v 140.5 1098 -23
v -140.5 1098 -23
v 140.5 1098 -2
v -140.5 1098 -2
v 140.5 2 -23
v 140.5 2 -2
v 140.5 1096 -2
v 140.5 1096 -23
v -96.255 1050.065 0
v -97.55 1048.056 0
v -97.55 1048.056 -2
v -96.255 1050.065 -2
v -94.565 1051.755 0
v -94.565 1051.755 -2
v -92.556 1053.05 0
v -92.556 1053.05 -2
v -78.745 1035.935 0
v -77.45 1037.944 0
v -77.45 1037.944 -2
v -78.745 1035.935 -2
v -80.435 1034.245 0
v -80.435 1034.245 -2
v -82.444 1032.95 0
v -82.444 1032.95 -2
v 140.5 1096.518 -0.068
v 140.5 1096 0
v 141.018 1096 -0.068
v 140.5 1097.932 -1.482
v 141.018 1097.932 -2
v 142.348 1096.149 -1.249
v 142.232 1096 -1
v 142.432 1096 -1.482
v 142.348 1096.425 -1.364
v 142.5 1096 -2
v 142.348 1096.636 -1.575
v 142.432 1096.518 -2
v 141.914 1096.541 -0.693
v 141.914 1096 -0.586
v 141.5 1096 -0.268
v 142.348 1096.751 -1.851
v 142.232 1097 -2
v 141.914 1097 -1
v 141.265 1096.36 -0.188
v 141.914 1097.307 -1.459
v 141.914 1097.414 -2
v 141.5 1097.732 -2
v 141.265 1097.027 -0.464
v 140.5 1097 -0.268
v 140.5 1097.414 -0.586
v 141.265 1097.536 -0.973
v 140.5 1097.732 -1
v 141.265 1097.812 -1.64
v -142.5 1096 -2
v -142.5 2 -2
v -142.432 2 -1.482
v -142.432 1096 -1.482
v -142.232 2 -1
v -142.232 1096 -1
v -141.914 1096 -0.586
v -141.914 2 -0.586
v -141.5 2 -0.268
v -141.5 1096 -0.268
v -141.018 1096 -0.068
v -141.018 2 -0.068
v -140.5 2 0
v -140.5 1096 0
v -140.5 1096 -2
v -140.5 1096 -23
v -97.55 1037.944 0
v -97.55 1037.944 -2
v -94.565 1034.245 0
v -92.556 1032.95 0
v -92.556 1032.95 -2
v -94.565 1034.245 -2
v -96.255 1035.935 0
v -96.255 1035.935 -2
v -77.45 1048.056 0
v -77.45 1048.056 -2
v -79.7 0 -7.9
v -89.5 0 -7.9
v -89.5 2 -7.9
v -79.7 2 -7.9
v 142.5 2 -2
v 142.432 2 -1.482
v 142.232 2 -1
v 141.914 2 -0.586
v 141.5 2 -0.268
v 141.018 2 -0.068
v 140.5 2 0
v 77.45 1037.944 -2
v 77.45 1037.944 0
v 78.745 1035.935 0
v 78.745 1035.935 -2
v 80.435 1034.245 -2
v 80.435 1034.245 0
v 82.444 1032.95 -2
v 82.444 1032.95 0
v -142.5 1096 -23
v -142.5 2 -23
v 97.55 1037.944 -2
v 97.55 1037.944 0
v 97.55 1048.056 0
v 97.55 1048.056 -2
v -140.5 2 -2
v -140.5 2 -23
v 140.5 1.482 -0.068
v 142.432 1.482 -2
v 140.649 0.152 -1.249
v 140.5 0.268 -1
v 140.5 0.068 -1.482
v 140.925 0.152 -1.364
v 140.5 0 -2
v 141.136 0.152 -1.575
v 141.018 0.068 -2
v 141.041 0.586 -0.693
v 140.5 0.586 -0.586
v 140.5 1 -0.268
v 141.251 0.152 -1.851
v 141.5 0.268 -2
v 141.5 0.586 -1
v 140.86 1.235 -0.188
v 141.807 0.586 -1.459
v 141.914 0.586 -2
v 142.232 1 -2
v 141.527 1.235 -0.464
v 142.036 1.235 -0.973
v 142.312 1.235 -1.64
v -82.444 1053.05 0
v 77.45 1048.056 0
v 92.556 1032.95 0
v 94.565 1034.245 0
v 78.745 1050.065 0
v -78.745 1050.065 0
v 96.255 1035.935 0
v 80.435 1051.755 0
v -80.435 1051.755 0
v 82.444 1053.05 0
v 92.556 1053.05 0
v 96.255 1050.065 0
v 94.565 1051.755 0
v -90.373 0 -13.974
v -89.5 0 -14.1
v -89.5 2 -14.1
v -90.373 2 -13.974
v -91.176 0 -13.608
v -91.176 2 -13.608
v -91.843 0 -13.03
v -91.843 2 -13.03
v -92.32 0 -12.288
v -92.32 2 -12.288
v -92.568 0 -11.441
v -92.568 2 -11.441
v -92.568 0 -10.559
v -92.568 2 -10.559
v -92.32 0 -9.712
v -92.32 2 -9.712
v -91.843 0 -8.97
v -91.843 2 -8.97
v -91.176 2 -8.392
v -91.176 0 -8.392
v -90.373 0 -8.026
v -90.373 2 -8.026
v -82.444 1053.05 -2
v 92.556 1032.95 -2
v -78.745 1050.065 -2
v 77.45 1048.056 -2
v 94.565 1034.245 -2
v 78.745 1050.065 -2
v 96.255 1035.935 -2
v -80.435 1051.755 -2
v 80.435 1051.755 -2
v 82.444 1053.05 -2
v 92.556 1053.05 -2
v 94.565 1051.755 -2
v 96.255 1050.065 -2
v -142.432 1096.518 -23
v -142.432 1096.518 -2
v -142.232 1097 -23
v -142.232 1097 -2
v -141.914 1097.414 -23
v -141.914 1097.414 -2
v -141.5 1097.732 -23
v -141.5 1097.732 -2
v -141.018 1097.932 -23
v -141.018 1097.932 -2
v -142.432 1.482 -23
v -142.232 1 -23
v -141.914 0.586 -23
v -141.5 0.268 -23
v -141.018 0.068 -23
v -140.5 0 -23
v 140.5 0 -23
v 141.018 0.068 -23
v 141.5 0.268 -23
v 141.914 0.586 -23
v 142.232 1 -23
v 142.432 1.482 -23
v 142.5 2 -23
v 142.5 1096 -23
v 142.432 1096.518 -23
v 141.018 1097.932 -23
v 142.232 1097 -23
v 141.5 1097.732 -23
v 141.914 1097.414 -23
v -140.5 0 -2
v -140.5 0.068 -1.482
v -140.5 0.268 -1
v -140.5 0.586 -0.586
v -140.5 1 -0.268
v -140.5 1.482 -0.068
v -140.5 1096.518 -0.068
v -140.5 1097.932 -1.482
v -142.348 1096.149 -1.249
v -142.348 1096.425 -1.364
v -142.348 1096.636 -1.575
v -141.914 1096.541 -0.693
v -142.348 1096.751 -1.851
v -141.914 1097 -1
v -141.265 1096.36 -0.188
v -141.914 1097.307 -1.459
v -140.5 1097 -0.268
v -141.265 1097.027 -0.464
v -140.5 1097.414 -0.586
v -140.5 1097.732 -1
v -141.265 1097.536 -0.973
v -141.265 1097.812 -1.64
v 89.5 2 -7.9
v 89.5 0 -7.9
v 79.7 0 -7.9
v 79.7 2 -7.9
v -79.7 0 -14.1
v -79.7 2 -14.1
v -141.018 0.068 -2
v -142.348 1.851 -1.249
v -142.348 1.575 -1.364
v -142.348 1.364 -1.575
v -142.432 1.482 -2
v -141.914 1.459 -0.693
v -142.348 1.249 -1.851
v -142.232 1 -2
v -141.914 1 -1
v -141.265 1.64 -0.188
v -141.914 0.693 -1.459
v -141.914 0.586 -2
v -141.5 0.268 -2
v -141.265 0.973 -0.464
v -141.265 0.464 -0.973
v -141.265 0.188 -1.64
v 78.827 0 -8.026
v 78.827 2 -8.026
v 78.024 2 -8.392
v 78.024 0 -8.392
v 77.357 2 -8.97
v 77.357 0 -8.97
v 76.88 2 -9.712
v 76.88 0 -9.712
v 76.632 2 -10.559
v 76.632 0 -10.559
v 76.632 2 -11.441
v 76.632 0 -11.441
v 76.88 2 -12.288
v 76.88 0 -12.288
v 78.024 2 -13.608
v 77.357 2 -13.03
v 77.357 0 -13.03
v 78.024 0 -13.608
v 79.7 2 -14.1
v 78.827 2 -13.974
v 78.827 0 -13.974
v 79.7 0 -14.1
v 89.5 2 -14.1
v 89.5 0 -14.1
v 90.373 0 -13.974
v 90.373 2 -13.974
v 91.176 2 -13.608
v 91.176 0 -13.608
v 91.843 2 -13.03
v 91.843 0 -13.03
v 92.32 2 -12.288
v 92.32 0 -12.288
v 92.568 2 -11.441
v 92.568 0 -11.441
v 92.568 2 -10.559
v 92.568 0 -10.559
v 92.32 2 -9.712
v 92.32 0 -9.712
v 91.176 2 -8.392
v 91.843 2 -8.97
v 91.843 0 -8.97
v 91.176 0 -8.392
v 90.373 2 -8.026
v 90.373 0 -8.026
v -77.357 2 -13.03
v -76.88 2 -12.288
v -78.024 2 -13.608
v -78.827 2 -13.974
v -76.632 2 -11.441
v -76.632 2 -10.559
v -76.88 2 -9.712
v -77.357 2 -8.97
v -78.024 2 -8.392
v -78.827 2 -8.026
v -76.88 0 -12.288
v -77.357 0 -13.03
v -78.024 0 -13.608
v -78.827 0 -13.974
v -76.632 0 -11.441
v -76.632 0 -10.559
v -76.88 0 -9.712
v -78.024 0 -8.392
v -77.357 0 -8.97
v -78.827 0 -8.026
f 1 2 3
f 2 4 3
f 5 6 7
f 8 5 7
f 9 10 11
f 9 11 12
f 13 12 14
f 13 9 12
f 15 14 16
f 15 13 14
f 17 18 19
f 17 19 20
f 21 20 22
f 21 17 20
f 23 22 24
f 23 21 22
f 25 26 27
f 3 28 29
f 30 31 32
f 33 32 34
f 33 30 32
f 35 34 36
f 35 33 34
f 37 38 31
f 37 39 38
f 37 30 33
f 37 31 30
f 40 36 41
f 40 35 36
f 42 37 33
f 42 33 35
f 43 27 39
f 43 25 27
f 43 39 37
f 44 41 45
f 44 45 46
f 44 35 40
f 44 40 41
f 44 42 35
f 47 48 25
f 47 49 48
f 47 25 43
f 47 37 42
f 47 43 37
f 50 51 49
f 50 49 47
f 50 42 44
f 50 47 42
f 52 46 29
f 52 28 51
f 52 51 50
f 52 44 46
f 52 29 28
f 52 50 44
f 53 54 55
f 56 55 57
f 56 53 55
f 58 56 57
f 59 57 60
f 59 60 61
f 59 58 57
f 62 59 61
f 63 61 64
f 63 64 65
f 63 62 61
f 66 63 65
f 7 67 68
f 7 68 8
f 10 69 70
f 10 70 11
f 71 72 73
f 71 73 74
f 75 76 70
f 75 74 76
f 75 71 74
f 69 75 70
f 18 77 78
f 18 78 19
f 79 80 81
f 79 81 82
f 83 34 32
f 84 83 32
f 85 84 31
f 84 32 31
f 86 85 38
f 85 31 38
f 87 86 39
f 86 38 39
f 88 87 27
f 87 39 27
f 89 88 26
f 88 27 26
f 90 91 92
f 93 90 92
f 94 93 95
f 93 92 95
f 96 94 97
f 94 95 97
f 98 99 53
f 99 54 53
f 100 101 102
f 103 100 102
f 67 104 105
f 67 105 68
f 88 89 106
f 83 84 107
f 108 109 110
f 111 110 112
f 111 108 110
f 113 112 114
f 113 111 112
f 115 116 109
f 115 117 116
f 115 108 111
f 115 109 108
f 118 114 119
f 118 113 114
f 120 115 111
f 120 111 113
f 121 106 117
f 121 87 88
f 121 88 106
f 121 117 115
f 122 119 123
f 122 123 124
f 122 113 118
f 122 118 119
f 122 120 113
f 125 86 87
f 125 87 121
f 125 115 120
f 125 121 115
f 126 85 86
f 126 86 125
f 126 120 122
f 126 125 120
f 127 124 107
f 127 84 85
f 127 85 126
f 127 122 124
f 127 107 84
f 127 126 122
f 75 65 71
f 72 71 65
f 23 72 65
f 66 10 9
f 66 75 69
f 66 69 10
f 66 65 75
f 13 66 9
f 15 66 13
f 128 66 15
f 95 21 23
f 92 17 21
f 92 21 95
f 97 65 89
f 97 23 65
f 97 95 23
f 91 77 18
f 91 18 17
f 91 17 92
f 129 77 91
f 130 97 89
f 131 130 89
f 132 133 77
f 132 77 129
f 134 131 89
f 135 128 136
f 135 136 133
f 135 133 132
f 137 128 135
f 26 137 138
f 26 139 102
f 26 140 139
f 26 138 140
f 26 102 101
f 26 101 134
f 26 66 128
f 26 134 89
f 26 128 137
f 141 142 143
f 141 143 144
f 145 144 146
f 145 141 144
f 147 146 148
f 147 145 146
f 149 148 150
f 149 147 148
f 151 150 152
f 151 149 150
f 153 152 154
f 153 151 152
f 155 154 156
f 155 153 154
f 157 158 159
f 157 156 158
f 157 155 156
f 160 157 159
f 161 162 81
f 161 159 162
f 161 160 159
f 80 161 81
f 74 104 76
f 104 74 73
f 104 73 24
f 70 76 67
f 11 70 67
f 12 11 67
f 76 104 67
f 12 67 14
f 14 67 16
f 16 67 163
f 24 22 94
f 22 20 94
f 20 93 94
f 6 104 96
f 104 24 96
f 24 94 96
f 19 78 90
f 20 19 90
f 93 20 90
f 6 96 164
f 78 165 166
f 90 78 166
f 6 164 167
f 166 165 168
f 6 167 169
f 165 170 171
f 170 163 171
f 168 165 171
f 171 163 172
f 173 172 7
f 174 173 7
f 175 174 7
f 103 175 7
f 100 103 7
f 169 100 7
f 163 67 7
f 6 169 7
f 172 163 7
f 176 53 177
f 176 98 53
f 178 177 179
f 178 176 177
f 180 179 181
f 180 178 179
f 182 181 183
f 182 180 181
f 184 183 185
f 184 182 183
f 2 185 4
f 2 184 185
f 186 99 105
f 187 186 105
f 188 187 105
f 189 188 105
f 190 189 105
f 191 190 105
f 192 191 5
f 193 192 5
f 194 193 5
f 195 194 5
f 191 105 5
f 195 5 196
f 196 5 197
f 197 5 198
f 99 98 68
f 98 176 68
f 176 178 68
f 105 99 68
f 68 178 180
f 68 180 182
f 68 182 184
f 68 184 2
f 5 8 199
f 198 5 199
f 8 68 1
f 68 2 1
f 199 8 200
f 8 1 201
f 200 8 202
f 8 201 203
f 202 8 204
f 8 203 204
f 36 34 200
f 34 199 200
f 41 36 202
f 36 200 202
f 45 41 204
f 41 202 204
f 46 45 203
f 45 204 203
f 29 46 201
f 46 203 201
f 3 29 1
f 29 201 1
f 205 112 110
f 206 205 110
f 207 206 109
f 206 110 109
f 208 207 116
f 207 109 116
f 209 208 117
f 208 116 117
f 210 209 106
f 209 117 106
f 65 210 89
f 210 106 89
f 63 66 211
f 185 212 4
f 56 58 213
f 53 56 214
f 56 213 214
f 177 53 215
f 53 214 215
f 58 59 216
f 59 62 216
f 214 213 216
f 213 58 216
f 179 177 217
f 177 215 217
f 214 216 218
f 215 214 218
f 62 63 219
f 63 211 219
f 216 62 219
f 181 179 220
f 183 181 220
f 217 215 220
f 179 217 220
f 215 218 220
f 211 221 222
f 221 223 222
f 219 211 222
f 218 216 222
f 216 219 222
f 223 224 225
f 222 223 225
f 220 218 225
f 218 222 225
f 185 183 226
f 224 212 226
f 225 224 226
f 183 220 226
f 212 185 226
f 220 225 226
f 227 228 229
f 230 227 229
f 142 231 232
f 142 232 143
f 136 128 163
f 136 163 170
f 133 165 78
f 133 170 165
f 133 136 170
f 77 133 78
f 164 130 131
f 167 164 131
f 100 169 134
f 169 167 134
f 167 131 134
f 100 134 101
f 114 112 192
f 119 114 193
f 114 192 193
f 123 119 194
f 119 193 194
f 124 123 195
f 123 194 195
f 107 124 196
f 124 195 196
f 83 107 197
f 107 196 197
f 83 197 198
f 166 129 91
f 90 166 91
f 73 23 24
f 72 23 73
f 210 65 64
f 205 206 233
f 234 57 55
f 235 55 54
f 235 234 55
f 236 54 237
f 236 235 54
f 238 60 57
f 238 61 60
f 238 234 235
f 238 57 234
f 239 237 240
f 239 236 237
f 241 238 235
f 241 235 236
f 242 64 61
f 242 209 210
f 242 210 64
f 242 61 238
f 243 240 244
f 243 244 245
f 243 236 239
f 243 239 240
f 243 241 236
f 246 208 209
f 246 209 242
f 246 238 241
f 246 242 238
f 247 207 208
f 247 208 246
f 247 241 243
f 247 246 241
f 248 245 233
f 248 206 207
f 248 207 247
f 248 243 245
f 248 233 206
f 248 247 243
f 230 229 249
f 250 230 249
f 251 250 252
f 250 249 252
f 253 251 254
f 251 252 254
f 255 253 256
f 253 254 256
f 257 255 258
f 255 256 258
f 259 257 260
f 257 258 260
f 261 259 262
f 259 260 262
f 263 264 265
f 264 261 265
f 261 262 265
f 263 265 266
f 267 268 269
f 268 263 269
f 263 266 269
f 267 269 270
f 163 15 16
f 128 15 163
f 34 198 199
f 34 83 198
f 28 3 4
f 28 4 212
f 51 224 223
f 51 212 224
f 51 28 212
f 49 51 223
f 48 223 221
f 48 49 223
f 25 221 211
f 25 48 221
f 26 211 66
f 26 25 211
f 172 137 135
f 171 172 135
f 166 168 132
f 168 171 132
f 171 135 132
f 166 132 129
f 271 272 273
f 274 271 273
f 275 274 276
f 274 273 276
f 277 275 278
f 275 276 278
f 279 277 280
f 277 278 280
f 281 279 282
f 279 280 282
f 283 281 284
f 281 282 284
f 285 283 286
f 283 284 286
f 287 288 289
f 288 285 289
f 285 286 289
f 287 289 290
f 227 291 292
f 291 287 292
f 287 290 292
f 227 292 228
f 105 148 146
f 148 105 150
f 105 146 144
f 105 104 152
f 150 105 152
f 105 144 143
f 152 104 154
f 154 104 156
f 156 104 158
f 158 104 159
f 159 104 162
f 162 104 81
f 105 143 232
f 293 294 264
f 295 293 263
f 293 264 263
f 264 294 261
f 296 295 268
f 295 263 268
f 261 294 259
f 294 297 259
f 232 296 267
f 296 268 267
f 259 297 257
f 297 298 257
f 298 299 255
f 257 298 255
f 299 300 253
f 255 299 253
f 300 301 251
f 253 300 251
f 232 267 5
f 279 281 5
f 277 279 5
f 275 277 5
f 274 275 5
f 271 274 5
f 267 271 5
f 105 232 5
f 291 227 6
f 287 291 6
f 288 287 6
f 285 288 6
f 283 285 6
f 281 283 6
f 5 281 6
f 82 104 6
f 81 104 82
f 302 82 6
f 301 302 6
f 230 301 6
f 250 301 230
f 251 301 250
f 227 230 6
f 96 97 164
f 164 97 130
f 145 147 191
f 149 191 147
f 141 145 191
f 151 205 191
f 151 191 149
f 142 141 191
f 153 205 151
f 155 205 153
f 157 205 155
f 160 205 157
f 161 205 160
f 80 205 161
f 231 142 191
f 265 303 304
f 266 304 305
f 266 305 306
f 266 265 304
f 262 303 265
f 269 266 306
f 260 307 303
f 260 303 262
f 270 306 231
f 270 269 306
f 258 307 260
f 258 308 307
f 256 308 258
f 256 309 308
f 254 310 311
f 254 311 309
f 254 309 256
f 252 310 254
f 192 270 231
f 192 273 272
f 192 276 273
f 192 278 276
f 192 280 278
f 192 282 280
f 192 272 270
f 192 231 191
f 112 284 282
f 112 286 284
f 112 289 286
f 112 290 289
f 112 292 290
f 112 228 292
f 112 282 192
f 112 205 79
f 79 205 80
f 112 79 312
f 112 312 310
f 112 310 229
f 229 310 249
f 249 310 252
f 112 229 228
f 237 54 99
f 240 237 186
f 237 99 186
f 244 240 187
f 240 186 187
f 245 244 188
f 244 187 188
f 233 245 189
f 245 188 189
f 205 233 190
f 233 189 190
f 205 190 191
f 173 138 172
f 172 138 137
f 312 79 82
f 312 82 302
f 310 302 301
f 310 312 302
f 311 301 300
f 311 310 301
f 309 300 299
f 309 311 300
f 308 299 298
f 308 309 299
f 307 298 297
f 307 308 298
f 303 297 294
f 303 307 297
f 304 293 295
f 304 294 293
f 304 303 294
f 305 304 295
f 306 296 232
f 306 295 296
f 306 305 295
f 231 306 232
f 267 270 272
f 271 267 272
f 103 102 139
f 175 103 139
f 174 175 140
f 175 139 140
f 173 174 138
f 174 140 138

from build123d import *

# Parameters (mm, degrees)
SKIZZE1_W                       = 285
SKIZZE1_H                       = 1098
BASIS_LINEAR_AUSTRAGEN_DEPTH    = 23
WANDUNG1_T                      = -2
VERRUNDUNG1_R                   = 2
SCHNITT_LINEAR_AUSTRAGEN1_REACH = 1109.447
SCHNITT_LINEAR_AUSTRAGEN2_REACH = 1109.447


with BuildPart() as part:
    # Skizze1 → Basis-Linear austragen (new body)
    with BuildSketch(Plane.XY):
        with Locations((0, 549)):
            Rectangle(SKIZZE1_W, SKIZZE1_H)
    extrude(amount=-BASIS_LINEAR_AUSTRAGEN_DEPTH)

    # Wandung1
    wandung1_openings = [part.faces().sort_by_distance(p)[0] for p in [
        (0, 549, -23),
    ]]
    offset(amount=WANDUNG1_T, openings=wandung1_openings, kind=Kind.INTERSECTION)

    # Verrundung1
    verrundung1_edges = [part.edges().sort_by_distance(p)[0] for p in [
        (0, 1098, 0),
        (142.5, 549, 0),
        (0, 0, 0),
        (-142.5, 549, 0),
        (-142.5, 1098, -11.5),
        (142.5, 1098, -11.5),
        (142.5, 0, -11.5),
        (-142.5, 0, -11.5),
    ]]
    fillet(verrundung1_edges, radius=VERRUNDUNG1_R)

    # Skizze2 → Schnitt-Linear austragen1 (cut, up to next)
    with BuildSketch(Plane.XY, mode=Mode.PRIVATE) as schnitt_linear_austragen1_sk1:
        with BuildLine():
            Line((-92.555689864, 1053.05), (-82.444310136, 1053.05))
            ThreePointArc((-82.444310136, 1053.05), (-79.545048712, 1050.954951288), (-77.45, 1048.055689864))
            Line((-77.45, 1048.055689864), (-77.45, 1037.944310136))
            ThreePointArc((-77.45, 1037.944310136), (-79.545048712, 1035.045048712), (-82.444310136, 1032.95))
            Line((-82.444310136, 1032.95), (-92.555689864, 1032.95))
            ThreePointArc((-92.555689864, 1032.95), (-95.454951288, 1035.045048712), (-97.55, 1037.944310136))
            Line((-97.55, 1037.944310136), (-97.55, 1048.055689864))
            ThreePointArc((-97.55, 1048.055689864), (-95.454951288, 1050.954951288), (-92.555689864, 1053.05))
        make_face()
    schnitt_linear_austragen1_tool1 = extrude(schnitt_linear_austragen1_sk1.sketch, amount=-SCHNITT_LINEAR_AUSTRAGEN1_REACH, mode=Mode.PRIVATE) & part.part
    schnitt_linear_austragen1 = schnitt_linear_austragen1_tool1.solids().sort_by_distance((-87.5, 1043, 0))[0]
    add(schnitt_linear_austragen1, mode=Mode.SUBTRACT)

    # Skizze3 → Schnitt-Linear austragen2 (cut, up to next)
    with BuildSketch(Plane.XZ, mode=Mode.PRIVATE) as schnitt_linear_austragen2_sk1:
        with BuildLine():
            Line((-89.5, -7.9), (-79.7, -7.9))
            ThreePointArc((-79.7, -7.9), (-76.6, -11), (-79.7, -14.1))
            Line((-79.7, -14.1), (-89.5, -14.1))
            ThreePointArc((-89.5, -14.1), (-92.6, -11), (-89.5, -7.9))
        make_face()
    schnitt_linear_austragen2_tool1 = extrude(schnitt_linear_austragen2_sk1.sketch, amount=-SCHNITT_LINEAR_AUSTRAGEN2_REACH, mode=Mode.PRIVATE) & part.part
    schnitt_linear_austragen2 = schnitt_linear_austragen2_tool1.solids().sort_by_distance((-84.6, 0, -11))[0]
    add(schnitt_linear_austragen2, mode=Mode.SUBTRACT)

    # Spiegeln1: Schnitt-Linear austragen1, Schnitt-Linear austragen2 across plane
    add(schnitt_linear_austragen1.mirror(Plane(origin=(0, 0, 0), x_dir=(0, 0, 1), z_dir=(1, 0, 0))), mode=Mode.SUBTRACT)
    add(schnitt_linear_austragen2.mirror(Plane(origin=(0, 0, 0), x_dir=(0, 0, 1), z_dir=(1, 0, 0))), mode=Mode.SUBTRACT)


solid = part.part
